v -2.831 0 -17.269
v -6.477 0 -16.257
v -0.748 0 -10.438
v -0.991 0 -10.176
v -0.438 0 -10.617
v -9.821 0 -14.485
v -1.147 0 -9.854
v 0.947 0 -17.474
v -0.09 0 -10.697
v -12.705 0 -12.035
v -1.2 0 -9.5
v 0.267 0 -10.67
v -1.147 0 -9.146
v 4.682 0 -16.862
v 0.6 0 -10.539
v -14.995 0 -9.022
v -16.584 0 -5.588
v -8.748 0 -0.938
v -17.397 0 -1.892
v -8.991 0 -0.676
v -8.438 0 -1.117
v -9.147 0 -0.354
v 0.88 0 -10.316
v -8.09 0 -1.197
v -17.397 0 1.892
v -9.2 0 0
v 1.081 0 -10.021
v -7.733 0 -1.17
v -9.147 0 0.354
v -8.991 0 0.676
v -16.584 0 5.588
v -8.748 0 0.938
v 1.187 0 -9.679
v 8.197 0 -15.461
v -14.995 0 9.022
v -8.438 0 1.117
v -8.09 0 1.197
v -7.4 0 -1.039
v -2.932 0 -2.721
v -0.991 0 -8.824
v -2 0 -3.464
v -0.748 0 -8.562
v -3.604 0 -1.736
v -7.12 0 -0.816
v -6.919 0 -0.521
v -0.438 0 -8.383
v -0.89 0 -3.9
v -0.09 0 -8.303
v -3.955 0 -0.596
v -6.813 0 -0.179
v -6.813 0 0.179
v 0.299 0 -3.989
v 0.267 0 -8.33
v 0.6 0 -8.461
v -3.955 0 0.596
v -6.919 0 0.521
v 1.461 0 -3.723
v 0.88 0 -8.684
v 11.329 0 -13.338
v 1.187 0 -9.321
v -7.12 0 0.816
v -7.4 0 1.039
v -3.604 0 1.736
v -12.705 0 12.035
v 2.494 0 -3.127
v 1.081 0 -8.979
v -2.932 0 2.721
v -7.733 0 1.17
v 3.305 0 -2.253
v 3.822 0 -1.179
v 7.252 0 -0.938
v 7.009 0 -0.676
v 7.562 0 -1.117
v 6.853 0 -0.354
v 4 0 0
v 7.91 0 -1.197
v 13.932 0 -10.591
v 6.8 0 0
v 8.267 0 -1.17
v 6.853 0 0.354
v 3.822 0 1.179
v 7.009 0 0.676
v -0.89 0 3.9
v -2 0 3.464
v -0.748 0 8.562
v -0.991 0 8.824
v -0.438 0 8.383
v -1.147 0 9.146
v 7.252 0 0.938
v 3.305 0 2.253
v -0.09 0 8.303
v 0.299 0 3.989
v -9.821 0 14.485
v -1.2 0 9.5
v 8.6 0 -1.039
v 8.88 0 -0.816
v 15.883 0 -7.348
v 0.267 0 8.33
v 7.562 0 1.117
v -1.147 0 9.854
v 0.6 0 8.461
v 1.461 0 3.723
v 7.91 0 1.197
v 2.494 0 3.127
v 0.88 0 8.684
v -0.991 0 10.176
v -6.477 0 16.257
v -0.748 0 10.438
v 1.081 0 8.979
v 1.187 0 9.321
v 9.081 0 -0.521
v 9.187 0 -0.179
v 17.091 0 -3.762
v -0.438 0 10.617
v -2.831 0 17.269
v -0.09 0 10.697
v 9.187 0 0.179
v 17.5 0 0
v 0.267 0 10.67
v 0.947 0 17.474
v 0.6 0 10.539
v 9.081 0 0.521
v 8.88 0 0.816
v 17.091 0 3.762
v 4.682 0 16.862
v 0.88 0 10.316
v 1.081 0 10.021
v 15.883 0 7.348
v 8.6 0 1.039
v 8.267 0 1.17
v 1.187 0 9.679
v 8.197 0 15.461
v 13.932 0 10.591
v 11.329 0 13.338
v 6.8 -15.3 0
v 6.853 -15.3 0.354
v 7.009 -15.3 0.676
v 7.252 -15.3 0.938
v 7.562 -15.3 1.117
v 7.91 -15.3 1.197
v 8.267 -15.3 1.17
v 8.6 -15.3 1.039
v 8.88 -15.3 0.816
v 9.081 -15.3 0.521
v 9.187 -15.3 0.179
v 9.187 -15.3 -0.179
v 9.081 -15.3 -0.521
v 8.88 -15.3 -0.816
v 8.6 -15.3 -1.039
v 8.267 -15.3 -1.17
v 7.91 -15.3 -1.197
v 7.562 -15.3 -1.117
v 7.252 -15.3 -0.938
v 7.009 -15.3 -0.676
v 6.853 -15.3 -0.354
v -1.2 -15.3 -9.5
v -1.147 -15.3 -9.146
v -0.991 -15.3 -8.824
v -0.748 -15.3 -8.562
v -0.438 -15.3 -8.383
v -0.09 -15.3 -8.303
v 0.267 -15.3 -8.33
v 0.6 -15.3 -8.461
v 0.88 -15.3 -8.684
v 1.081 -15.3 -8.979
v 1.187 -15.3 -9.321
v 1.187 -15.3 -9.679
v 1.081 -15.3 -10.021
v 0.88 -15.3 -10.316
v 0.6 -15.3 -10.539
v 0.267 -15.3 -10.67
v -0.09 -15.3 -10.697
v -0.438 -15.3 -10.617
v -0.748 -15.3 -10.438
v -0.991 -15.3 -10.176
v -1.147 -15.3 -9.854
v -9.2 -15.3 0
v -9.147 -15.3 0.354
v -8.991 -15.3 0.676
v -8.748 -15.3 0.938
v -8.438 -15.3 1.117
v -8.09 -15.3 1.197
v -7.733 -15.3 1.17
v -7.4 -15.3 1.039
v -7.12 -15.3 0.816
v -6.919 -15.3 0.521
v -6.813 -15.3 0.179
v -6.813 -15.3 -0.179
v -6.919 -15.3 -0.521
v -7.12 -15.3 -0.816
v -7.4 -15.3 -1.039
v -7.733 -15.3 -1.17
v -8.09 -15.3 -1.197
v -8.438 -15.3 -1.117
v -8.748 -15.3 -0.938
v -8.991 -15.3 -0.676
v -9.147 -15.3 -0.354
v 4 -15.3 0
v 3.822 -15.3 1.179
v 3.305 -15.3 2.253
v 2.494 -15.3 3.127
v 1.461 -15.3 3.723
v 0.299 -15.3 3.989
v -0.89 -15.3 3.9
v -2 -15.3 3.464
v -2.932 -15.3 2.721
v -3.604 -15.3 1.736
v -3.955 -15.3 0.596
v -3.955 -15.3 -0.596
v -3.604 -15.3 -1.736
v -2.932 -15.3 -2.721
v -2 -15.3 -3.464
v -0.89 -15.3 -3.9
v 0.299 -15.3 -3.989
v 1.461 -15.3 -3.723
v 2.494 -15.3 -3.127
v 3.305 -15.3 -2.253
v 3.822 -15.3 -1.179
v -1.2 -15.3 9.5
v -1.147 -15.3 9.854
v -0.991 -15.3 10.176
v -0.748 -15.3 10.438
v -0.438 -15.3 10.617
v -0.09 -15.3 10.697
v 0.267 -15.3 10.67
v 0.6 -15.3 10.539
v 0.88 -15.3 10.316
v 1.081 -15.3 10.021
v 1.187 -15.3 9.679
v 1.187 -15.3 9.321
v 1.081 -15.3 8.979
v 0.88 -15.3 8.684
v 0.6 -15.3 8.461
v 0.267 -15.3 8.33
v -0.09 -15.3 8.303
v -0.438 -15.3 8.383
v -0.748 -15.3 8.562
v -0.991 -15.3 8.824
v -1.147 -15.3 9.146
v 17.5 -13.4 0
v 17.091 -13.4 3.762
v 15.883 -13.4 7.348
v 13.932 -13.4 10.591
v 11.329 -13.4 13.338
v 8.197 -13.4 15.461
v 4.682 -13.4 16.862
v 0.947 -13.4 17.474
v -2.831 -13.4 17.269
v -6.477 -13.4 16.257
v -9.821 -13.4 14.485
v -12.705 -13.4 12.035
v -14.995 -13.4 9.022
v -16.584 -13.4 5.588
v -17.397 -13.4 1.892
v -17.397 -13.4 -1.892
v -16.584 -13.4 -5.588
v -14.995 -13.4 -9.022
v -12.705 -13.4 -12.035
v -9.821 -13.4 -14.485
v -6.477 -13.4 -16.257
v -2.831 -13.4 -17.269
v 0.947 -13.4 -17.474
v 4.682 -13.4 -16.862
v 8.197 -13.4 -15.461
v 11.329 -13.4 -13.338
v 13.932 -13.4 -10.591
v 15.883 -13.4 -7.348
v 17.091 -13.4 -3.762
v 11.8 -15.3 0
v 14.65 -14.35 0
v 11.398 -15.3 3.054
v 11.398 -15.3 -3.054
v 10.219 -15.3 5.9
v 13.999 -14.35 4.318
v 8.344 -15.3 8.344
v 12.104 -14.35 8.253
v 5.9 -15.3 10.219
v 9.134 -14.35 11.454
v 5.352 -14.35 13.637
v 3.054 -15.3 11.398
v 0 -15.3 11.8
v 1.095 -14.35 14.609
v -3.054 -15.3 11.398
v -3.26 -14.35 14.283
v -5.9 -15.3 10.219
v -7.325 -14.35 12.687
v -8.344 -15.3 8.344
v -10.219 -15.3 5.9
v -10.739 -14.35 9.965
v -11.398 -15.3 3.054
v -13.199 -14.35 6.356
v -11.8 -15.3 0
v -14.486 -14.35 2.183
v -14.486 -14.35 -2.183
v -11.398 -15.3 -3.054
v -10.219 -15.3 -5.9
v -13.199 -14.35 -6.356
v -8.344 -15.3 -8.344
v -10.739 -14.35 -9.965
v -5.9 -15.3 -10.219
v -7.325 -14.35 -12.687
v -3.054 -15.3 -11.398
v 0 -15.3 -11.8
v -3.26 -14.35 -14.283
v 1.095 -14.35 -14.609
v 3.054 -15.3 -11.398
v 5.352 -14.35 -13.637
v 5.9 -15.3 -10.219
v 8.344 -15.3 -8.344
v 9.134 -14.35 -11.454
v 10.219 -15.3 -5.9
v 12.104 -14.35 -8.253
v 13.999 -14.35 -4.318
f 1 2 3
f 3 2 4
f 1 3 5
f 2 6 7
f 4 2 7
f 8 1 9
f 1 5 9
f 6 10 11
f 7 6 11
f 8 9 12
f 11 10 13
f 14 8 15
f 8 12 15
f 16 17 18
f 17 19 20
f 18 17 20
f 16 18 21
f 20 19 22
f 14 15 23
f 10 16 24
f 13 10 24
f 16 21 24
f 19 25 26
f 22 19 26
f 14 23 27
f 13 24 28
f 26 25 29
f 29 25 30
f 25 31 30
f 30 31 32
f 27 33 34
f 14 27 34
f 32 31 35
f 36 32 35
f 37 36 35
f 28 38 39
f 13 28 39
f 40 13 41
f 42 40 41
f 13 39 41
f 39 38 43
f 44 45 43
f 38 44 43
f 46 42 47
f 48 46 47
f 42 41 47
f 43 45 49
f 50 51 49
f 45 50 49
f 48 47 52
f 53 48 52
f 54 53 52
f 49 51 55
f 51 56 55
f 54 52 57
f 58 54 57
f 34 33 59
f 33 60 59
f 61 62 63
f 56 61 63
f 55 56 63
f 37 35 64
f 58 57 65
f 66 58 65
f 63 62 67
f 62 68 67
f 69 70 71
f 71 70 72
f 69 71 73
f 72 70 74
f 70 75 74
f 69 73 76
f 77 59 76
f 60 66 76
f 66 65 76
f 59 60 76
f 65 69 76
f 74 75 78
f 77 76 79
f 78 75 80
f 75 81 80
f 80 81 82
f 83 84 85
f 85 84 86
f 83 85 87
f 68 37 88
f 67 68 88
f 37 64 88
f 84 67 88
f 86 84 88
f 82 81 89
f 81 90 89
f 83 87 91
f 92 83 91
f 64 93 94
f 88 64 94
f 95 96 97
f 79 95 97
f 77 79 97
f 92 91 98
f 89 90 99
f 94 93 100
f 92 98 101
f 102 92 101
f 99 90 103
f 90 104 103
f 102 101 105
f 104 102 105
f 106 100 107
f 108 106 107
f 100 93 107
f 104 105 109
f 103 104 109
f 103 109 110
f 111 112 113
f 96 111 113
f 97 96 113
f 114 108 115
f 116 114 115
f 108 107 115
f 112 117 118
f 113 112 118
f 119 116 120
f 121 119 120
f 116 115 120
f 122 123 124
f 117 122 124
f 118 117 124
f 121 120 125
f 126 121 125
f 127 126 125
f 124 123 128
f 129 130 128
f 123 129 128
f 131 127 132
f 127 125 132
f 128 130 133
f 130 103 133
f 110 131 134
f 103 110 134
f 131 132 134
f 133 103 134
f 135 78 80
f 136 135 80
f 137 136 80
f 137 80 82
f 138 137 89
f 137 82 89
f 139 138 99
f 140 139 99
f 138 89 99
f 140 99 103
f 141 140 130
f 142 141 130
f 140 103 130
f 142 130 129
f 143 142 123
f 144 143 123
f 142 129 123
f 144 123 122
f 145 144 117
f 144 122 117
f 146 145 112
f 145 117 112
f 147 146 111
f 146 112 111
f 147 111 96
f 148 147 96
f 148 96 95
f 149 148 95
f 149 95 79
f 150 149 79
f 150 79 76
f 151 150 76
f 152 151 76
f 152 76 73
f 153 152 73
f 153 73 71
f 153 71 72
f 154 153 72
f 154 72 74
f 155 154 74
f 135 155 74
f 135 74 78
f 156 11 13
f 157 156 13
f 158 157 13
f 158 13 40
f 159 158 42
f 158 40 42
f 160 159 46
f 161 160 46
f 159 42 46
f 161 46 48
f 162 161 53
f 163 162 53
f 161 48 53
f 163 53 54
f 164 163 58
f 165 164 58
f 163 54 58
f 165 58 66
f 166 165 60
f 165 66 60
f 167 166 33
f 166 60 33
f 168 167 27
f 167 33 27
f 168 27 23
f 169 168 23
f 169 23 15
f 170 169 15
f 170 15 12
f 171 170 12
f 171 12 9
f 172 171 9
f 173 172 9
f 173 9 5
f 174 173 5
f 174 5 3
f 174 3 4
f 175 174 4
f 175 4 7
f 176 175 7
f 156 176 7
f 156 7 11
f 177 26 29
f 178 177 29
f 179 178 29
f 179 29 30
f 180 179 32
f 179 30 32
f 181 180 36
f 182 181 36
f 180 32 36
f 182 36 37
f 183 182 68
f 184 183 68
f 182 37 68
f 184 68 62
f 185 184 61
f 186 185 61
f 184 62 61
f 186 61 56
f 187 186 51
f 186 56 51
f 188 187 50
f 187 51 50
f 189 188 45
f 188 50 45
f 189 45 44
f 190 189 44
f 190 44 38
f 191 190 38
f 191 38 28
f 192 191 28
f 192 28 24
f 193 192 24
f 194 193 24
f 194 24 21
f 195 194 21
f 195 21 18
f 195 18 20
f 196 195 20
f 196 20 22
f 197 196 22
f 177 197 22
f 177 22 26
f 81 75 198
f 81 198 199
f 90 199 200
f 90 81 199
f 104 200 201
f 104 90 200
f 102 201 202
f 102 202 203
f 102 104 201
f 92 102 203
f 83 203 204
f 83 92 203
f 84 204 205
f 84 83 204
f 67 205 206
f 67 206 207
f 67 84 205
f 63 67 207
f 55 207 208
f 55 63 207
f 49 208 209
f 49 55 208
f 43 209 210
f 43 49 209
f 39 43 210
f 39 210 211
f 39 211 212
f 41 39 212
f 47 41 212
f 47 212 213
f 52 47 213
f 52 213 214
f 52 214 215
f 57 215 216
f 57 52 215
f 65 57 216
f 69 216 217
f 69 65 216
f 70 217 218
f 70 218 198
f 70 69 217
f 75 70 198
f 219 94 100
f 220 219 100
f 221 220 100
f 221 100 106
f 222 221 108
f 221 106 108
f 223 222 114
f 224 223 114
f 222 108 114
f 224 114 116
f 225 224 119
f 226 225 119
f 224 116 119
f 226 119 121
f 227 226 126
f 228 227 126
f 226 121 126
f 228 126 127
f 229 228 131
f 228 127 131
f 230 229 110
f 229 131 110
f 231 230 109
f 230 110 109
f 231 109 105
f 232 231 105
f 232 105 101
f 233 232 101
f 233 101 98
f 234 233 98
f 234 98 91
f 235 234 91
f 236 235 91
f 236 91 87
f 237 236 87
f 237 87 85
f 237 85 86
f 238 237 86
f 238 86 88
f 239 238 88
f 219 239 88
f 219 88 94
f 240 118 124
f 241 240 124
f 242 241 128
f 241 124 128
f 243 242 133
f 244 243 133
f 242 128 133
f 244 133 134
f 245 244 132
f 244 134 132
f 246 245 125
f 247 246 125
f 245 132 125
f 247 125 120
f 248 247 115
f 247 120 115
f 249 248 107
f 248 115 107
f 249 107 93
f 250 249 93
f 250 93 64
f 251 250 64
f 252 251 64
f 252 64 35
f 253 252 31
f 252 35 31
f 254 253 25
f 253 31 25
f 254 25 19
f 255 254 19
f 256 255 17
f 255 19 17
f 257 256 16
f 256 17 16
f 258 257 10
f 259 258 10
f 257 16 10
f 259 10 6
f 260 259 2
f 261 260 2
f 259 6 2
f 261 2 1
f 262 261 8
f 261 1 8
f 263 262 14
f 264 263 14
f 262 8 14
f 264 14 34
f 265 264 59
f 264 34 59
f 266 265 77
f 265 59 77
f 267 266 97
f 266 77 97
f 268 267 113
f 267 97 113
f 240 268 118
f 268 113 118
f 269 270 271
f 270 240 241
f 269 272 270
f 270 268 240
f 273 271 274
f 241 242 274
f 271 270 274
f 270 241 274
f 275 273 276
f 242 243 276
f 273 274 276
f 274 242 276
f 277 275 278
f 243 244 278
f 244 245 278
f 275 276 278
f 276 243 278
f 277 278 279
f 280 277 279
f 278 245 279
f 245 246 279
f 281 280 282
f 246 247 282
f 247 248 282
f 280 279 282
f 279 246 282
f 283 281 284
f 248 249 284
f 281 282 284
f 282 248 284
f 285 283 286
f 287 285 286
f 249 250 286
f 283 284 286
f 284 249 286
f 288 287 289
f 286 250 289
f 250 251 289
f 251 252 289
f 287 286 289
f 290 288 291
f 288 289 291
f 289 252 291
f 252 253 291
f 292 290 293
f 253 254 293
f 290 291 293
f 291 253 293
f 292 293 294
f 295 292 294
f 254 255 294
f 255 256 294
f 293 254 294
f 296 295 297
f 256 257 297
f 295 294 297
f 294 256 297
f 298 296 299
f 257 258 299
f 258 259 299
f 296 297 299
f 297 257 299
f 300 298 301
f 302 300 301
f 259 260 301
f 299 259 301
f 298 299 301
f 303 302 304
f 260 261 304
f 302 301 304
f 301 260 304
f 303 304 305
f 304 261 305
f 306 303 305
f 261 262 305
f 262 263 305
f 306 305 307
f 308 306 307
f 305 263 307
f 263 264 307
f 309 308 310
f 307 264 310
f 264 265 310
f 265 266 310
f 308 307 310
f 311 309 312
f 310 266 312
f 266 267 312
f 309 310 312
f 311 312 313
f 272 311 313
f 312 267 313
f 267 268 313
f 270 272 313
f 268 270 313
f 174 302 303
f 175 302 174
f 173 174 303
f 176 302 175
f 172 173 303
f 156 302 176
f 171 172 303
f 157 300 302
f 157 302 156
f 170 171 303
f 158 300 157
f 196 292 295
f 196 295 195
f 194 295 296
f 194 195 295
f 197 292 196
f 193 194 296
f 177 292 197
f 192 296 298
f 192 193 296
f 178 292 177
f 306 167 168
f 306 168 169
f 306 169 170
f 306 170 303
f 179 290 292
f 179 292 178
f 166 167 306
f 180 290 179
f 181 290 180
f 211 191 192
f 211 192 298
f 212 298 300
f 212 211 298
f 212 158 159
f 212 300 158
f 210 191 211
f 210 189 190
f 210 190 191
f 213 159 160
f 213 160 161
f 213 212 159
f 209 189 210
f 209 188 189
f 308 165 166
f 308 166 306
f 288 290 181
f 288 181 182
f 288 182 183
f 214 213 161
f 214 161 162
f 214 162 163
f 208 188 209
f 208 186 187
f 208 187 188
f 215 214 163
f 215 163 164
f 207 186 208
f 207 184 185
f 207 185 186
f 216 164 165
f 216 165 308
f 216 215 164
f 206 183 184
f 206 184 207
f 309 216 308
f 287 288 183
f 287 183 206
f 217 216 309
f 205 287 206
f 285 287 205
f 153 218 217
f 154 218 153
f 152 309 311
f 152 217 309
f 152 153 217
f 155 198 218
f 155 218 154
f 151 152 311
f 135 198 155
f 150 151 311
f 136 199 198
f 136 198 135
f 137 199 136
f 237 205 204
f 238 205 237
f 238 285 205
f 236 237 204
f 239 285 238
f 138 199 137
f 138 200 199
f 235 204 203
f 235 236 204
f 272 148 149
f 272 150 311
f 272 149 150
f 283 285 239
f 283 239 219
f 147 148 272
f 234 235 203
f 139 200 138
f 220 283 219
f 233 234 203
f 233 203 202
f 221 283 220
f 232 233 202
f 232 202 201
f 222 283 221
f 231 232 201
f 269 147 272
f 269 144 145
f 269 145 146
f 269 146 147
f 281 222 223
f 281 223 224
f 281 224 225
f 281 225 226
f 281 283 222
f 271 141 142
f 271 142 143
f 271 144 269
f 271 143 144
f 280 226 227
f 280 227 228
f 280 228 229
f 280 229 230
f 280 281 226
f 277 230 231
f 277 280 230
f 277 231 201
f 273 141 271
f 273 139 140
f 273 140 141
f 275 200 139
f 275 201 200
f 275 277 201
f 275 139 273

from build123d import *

# Parameters (mm, degrees)
F0_R     = 17.5
F0_R_2   = 4
F1_DEPTH = 15.3
F2_SIZE2 = 1.9
F2_SIZE  = 5.7
F4_D     = 2.4


with BuildPart() as f1:
    # F0 (on Front) → F1 (new body)
    with BuildSketch(Plane.XZ):
        Circle(F0_R)
        Circle(F0_R_2, mode=Mode.SUBTRACT)
    extrude(amount=F1_DEPTH)

    # F2
    f2_edges = [f1.edges().sort_by_distance(p)[0] for p in [
        (-17.5, -15.3, 0),
    ]]
    f2_side = f1.faces().sort_by_distance((-17.005025, -15.3, 0))[0]
    chamfer(f2_edges, length=F2_SIZE, length2=F2_SIZE2, reference=f2_side)

    # F4 (through all)
    with Locations(Plane.XZ.offset(15.3)):
        with Locations((0, 9.5), (-8, 0), (0, -9.5), (8, 0)):
            Hole(F4_D / 2)


solid = f1.part
